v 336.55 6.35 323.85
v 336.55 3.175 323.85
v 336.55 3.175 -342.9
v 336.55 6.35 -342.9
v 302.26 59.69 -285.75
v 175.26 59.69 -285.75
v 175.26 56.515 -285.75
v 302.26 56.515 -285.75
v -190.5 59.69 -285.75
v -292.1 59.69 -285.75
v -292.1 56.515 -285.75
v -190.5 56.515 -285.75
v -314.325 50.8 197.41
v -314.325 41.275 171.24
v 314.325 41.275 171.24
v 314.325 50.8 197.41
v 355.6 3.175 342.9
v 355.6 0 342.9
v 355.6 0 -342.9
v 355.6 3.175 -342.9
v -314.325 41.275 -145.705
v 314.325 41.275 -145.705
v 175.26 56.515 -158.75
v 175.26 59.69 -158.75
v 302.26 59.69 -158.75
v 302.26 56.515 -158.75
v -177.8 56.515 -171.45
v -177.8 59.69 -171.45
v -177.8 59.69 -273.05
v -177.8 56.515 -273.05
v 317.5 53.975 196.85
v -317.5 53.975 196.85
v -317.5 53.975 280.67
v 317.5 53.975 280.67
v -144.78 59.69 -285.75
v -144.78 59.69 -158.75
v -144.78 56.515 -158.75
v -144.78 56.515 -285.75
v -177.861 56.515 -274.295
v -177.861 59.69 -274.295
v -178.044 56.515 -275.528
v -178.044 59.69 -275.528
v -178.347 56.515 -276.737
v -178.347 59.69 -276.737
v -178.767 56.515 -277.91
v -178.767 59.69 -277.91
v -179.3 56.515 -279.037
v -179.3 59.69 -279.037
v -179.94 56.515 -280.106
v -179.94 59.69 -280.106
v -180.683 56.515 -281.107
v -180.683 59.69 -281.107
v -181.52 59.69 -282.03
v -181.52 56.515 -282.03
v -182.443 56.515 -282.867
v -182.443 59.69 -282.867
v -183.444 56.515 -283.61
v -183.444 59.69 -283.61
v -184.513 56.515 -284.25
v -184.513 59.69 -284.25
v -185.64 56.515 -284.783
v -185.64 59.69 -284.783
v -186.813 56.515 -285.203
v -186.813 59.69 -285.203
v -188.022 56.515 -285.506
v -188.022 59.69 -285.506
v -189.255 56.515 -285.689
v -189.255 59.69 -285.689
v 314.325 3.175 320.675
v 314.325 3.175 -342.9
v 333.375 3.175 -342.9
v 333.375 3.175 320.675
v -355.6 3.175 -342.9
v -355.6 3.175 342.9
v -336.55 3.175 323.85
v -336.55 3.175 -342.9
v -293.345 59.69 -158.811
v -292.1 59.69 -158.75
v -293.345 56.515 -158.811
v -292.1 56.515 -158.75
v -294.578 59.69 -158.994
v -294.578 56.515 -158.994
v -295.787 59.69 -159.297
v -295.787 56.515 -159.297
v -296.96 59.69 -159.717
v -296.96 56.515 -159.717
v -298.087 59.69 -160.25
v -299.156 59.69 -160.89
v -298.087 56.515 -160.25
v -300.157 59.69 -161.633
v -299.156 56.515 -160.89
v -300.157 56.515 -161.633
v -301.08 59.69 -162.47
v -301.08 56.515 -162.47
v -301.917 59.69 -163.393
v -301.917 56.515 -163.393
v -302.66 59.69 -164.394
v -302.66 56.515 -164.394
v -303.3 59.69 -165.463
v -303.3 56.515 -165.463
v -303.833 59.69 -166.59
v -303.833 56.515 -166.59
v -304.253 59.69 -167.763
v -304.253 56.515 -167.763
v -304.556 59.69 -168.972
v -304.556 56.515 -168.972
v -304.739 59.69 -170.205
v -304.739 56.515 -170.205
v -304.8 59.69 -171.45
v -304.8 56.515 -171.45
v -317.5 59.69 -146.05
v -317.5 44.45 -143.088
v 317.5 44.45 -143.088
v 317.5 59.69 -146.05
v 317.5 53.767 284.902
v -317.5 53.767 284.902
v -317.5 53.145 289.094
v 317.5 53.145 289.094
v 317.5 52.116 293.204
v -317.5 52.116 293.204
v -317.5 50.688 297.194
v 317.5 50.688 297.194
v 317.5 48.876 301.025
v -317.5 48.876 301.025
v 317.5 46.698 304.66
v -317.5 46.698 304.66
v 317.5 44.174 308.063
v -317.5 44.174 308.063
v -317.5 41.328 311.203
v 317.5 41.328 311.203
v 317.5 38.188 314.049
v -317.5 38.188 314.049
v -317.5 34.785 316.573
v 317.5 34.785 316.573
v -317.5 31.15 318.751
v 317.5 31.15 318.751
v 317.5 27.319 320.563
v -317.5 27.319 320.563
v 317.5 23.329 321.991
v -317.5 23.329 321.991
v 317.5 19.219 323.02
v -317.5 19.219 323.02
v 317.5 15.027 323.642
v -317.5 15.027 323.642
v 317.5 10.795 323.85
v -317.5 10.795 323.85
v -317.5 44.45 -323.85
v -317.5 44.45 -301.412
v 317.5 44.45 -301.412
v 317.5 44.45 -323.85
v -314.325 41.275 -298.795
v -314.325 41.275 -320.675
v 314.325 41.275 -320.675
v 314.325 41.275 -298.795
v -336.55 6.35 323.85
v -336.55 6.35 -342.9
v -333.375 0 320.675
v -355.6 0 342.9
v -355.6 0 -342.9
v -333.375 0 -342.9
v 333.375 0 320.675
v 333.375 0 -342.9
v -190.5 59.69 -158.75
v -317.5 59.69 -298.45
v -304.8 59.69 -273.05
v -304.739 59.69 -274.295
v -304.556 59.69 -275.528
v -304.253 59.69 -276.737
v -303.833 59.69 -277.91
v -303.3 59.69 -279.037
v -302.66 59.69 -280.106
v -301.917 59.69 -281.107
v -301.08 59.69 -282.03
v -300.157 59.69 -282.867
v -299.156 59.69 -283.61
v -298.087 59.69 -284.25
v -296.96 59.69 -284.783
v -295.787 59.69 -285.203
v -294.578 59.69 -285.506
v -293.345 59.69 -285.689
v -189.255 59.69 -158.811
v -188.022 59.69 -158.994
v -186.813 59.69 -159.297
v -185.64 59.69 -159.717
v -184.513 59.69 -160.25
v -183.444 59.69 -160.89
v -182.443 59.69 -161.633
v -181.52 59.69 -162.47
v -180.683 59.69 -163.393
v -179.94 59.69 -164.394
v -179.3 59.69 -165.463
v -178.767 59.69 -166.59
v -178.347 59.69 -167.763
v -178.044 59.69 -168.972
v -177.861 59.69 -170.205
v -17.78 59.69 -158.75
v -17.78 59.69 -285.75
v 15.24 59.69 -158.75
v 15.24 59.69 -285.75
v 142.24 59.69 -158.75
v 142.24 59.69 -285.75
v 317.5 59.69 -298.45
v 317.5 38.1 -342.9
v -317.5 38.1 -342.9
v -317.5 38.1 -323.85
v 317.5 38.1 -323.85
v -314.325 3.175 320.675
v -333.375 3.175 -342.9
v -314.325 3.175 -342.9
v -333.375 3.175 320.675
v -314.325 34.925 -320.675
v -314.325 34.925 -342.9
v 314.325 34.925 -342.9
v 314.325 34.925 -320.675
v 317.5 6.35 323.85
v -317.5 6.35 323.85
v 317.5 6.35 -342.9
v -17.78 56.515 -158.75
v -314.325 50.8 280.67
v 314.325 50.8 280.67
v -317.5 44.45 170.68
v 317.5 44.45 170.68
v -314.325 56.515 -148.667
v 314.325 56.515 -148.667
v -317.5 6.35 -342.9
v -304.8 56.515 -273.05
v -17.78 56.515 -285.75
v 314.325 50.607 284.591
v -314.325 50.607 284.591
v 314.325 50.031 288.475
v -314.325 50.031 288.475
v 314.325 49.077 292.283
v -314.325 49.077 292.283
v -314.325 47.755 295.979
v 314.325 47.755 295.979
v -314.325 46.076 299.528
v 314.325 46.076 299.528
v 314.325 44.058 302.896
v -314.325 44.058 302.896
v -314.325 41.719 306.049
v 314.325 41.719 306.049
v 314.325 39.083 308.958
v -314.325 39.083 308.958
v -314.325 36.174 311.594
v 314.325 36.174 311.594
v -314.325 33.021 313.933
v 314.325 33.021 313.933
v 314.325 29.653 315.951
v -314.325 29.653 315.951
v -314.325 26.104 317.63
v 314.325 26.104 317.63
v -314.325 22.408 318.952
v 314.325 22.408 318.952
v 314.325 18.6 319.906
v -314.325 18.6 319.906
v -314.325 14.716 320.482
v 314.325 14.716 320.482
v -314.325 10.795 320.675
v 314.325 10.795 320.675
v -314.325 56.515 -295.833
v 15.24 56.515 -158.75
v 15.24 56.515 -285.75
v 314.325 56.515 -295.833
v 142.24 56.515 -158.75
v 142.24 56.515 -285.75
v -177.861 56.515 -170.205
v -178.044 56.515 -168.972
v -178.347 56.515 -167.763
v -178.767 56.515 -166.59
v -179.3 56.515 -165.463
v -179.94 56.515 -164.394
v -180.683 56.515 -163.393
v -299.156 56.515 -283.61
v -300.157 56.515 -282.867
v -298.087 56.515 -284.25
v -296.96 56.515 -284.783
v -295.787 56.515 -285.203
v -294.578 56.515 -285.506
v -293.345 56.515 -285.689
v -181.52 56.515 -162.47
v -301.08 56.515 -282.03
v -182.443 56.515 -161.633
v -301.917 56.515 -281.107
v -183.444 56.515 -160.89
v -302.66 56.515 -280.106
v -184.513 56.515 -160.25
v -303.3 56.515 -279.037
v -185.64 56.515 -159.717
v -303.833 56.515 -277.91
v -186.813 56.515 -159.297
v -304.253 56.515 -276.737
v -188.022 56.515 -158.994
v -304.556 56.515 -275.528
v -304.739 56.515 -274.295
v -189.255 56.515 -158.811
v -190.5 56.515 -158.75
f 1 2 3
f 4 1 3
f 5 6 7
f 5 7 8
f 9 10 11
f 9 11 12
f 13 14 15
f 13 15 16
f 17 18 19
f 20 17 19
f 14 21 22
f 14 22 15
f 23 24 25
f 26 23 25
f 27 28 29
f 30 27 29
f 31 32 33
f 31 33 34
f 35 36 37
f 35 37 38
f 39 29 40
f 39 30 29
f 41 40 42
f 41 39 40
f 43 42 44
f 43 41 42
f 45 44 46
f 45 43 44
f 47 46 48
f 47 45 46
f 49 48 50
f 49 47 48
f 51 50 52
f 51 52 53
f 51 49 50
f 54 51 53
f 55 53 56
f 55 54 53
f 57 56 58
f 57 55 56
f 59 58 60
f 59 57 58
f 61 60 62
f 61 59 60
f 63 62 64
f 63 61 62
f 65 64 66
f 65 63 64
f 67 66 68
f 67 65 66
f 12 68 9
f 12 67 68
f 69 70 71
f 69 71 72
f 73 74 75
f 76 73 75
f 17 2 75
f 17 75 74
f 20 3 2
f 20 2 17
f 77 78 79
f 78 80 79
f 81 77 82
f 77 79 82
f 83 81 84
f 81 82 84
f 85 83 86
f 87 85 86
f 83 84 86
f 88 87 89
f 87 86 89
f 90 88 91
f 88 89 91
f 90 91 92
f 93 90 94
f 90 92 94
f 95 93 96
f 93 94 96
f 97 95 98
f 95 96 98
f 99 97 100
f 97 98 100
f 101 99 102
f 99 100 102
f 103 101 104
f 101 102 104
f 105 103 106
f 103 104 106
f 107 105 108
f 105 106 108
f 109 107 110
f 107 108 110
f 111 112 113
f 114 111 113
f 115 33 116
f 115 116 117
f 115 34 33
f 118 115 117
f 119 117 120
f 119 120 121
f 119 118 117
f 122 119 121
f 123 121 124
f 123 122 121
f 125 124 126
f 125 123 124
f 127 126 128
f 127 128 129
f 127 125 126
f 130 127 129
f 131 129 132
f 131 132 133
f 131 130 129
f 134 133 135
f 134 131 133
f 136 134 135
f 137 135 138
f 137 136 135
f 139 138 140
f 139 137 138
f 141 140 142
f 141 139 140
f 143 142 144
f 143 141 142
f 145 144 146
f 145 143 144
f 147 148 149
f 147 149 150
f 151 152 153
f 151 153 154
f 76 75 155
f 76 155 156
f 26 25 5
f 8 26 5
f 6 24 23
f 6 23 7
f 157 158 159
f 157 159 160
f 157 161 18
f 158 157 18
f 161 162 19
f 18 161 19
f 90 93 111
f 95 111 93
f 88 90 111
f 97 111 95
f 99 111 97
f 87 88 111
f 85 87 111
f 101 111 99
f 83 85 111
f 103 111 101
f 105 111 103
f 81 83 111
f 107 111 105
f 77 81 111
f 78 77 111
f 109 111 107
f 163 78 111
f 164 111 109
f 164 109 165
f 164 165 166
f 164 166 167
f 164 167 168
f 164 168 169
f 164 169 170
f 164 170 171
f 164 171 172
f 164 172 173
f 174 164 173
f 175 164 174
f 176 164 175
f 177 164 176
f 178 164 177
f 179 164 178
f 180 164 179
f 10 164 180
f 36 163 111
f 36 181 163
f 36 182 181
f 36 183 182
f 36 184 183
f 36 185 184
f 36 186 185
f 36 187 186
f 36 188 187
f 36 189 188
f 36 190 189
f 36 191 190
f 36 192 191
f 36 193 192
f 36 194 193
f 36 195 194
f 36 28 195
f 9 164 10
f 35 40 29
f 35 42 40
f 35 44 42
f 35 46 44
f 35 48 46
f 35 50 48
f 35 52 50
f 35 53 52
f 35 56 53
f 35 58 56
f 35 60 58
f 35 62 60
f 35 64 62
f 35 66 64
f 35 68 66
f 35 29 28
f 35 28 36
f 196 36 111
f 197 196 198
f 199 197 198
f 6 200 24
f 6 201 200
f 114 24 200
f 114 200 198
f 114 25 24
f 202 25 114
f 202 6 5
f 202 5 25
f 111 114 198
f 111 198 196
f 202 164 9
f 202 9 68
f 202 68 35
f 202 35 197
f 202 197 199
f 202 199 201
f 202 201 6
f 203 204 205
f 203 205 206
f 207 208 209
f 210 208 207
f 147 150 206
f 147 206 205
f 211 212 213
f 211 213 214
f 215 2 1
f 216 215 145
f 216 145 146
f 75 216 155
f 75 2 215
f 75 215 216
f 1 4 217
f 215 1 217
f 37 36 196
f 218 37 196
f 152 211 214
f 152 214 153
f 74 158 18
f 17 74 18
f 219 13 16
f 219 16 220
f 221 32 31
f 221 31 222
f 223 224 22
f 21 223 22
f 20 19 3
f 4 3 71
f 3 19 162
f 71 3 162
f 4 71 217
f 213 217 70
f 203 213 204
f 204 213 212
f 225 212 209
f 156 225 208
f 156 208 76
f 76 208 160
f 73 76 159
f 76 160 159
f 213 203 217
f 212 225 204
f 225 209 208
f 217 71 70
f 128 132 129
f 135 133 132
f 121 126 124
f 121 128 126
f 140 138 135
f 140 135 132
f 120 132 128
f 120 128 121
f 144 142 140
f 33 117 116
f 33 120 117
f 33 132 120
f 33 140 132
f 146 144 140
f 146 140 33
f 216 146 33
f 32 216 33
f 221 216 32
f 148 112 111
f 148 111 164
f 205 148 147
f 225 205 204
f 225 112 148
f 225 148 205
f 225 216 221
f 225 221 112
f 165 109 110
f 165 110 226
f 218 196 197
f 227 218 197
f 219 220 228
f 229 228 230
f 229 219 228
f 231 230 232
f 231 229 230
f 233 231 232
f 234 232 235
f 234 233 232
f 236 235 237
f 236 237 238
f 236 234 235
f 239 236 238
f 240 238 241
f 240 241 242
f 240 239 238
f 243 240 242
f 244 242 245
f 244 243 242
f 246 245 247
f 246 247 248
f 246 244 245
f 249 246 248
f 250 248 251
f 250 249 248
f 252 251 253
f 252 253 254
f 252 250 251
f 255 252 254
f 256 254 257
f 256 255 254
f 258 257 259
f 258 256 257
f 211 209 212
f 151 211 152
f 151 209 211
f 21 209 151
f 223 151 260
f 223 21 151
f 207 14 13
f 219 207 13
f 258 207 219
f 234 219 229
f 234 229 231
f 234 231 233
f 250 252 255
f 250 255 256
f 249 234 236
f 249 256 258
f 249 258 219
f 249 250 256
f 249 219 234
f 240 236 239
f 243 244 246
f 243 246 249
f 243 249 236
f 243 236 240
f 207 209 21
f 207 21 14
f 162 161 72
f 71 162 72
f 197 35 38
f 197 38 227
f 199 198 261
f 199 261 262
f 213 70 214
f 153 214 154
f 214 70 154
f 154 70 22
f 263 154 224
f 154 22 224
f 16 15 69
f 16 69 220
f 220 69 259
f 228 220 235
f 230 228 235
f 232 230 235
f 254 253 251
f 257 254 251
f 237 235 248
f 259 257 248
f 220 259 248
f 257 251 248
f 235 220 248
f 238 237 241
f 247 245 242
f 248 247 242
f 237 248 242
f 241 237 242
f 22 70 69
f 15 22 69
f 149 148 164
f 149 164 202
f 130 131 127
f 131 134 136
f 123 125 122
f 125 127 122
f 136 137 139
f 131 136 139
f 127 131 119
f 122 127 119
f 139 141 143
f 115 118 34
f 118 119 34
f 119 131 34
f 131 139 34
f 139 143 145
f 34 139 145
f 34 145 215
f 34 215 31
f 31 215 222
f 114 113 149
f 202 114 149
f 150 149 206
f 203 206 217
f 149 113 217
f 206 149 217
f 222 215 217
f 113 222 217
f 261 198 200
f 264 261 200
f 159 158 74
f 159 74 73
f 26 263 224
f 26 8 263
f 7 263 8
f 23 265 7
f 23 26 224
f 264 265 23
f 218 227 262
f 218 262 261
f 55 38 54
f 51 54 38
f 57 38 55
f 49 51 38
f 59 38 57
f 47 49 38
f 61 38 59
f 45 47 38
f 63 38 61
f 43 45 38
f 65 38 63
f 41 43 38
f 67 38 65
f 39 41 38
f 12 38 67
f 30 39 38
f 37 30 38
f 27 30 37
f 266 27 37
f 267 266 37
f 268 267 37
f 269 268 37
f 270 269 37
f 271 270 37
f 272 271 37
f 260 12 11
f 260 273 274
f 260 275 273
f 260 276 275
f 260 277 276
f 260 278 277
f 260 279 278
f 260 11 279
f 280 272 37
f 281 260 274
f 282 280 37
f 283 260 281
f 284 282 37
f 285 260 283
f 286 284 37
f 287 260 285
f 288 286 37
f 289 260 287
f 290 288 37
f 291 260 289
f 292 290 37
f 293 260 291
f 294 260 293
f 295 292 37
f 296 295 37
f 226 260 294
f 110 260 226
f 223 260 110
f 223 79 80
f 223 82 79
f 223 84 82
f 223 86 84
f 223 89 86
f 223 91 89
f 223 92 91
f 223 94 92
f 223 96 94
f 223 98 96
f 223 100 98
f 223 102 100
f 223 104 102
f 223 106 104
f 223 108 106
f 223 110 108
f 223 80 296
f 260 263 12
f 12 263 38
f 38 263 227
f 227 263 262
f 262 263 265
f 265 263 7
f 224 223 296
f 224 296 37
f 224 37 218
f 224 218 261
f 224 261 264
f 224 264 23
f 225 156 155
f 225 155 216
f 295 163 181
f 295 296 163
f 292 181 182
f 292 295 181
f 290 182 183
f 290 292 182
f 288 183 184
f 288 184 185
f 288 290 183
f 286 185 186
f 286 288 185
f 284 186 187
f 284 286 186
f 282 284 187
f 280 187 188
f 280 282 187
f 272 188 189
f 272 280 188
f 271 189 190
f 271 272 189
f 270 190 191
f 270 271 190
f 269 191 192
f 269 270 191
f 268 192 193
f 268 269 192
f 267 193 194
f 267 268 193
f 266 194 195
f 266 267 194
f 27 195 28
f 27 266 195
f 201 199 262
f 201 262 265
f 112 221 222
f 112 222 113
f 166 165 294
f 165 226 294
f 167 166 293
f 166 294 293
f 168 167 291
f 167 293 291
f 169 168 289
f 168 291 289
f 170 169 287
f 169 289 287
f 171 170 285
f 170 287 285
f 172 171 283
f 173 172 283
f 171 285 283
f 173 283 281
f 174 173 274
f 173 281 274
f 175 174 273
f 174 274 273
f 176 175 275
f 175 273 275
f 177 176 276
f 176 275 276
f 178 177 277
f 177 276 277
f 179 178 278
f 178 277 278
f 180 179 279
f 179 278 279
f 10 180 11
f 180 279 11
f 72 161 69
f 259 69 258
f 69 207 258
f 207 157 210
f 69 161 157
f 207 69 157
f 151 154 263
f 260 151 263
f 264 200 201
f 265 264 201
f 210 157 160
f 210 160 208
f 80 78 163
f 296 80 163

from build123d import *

# Parameters (mm, degrees)
SKETCH1_W               = 711.2
SKETCH1_H               = 685.8
BOSS_EXTRUDE1_DEPTH     = 3.175
SKETCH2_W               = 635
SKETCH2_H               = 666.75
BOSS_EXTRUDE2_DEPTH     = 50.8
CUT_EXTRUDE1_DEPTH      = 497.935680571
CUT_EXTRUDE1_DEPTH_BACK = 497.935680571
SKETCH4_W               = 19.05
SKETCH4_H               = 666.75
BOSS_EXTRUDE3_DEPTH     = 3.175
SKETCH5_W               = 317.5
SKETCH5_H               = 6.35
CUT_EXTRUDE2_DEPTH      = 19.05
FILLET1_R               = 43.18
SKETCH6_W               = 635
SKETCH6_H               = 152.4
BOSS_EXTRUDE4_DEPTH     = 15.24
DRAFT2_ANGLE            = 11
SHELL1_START            = -314.325
SHELL1_DEPTH            = 628.65
SHELL1_START_2          = -333.375
SHELL1_2_OUTLINE_W      = 3.175
SHELL1_2_OUTLINE_H      = 663.575
SHELL1_2_DEPTH          = 666.75
SKETCH7_W               = 127
SKETCH7_H               = 127
CUT_EXTRUDE3_DEPTH      = 25.4
LPATTERN1_COUNT         = 4
LPATTERN1_PITCH         = 160.02
FILLET2_R               = 12.7


# Read off the part's stored shape, not the designer's step: Shell1
with BuildPart() as part:
    # Sketch1 → Boss-Extrude1 (new body)
    with BuildSketch(Plane(origin=(0, 0, 0), x_dir=(1, 0, 0), z_dir=(0, 1, 0))):
        Rectangle(SKETCH1_W, SKETCH1_H)
    extrude(amount=BOSS_EXTRUDE1_DEPTH)

    # Sketch2 → Boss-Extrude2 (add)
    with BuildSketch(Plane(origin=(0, 3.175, 0), x_dir=(1, 0, 0), z_dir=(0, 1, 0))):
        with Locations((0, 9.525)):
            Rectangle(SKETCH2_W, SKETCH2_H)
    extrude(amount=BOSS_EXTRUDE2_DEPTH)

    # Sketch3 → Cut-Extrude1 (cut, two sides: drawn at the far end of the back side and taken through both)
    with BuildSketch(Plane(origin=(0, 0, 0), x_dir=(0, 0, -1), z_dir=(1, 0, 0)).offset(-CUT_EXTRUDE1_DEPTH_BACK)):
        Polygon((-196.85, 53.975), (-170.68027758, 44.45), (342.9, 44.45), (342.9, 53.975), align=None)
    extrude(amount=CUT_EXTRUDE1_DEPTH + CUT_EXTRUDE1_DEPTH_BACK, mode=Mode.SUBTRACT)

    # Sketch4 → Boss-Extrude3 (add)
    with BuildSketch(Plane(origin=(0, 3.175, 0), x_dir=(1, 0, 0), z_dir=(0, 1, 0))):
        with Locations((-327.025, 9.525)):
            Rectangle(SKETCH4_W, SKETCH4_H)
    boss_extrude3 = extrude(amount=BOSS_EXTRUDE3_DEPTH)

    # Mirror1: Boss-Extrude3 across plane
    add(boss_extrude3.mirror(Plane(origin=(0, 0, 0), x_dir=(0, 0, 1), z_dir=(1, 0, 0))))

    # Sketch5 → Cut-Extrude2 (cut)
    with BuildSketch(Plane(origin=(0, 0, -342.9), x_dir=(-1, 0, 0), z_dir=(0, 0, -1))):
        with Locations((-158.75, 41.275)):
            Rectangle(SKETCH5_W, SKETCH5_H)
    cut_extrude2 = extrude(amount=-CUT_EXTRUDE2_DEPTH, mode=Mode.SUBTRACT)

    # Mirror2: Cut-Extrude2 across plane
    add(cut_extrude2.mirror(Plane(origin=(0, 0, 0), x_dir=(0, 0, 1), z_dir=(1, 0, 0))), mode=Mode.SUBTRACT)

    # Fillet1
    fillet1_edges = [part.edges().sort_by_distance(p)[0] for p in [
        (0, 53.975, 323.85),
    ]]
    fillet(fillet1_edges, radius=FILLET1_R)

    # Sketch6 → Boss-Extrude4 (add)
    with BuildSketch(Plane(origin=(0, 44.45, 0), x_dir=(1, 0, 0), z_dir=(0, 1, 0))):
        with Locations((0, 222.25)):
            Rectangle(SKETCH6_W, SKETCH6_H)
    extrude(amount=BOSS_EXTRUDE4_DEPTH)

    # Draft2
    draft2_faces = [part.faces().sort_by_distance(p)[0] for p in [
        (0, 52.07, -146.05),
        (0, 52.07, -298.45),
    ]]
    draft(draft2_faces, Plane.ZX.offset(59.69), DRAFT2_ANGLE)

    # Shell1 outline → Shell1 (cut)
    with BuildSketch(Plane.YZ.offset(SHELL1_START)):
        with BuildLine():
            Line((41.275, -145.704912114), (41.275, 171.240115743))
            Line((41.275, 171.240115743), (50.8, 197.409838164))
            Line((50.8, 197.409838164), (50.8, 280.67))
            ThreePointArc((50.8, 280.67), (39.082806781, 308.957806781), (10.795, 320.675))
            Line((10.795, 320.675), (0, 320.675))
            Line((0, 320.675), (0, -342.9))
            Line((0, -342.9), (34.925, -342.9))
            Line((34.925, -342.9), (34.925, -320.675))
            Line((34.925, -320.675), (41.275, -320.675))
            Line((41.275, -320.675), (41.275, -298.795087886))
            Line((41.275, -298.795087886), (56.515, -295.832731975))
            Line((56.515, -295.832731975), (56.515, -148.667268025))
            Line((56.515, -148.667268025), (41.275, -145.704912114))
        make_face()
    extrude(amount=SHELL1_DEPTH, mode=Mode.SUBTRACT)

    # Shell1 2 outline → Shell1 2 (cut)
    with BuildSketch(Plane.YZ.offset(SHELL1_START_2)):
        with Locations((1.5875, -11.1125)):
            Rectangle(SHELL1_2_OUTLINE_W, SHELL1_2_OUTLINE_H)
    extrude(amount=SHELL1_2_DEPTH, mode=Mode.SUBTRACT)

    # Sketch7 → Cut-Extrude3 (cut)
    with BuildSketch(Plane(origin=(0, 59.69, 0), x_dir=(1, 0, 0), z_dir=(0, 1, 0))):
        with Locations((-241.3, 222.25)):
            Rectangle(SKETCH7_W, SKETCH7_H)
    cut_extrude3 = extrude(amount=-CUT_EXTRUDE3_DEPTH, mode=Mode.SUBTRACT)

    # LPattern1: Cut-Extrude3 ×4
    with Locations(*[(i * LPATTERN1_PITCH, 0, 0) for i in range(1, LPATTERN1_COUNT)]):
        add(cut_extrude3, mode=Mode.SUBTRACT)

    # Fillet2
    fillet2_edges = [part.edges().sort_by_distance(p)[0] for p in [
        (-304.8, 58.1025, -158.75),
        (-304.8, 58.1025, -285.75),
        (-177.8, 58.1025, -285.75),
        (-177.8, 58.1025, -158.75),
    ]]
    fillet(fillet2_edges, radius=FILLET2_R)


solid = part.part
